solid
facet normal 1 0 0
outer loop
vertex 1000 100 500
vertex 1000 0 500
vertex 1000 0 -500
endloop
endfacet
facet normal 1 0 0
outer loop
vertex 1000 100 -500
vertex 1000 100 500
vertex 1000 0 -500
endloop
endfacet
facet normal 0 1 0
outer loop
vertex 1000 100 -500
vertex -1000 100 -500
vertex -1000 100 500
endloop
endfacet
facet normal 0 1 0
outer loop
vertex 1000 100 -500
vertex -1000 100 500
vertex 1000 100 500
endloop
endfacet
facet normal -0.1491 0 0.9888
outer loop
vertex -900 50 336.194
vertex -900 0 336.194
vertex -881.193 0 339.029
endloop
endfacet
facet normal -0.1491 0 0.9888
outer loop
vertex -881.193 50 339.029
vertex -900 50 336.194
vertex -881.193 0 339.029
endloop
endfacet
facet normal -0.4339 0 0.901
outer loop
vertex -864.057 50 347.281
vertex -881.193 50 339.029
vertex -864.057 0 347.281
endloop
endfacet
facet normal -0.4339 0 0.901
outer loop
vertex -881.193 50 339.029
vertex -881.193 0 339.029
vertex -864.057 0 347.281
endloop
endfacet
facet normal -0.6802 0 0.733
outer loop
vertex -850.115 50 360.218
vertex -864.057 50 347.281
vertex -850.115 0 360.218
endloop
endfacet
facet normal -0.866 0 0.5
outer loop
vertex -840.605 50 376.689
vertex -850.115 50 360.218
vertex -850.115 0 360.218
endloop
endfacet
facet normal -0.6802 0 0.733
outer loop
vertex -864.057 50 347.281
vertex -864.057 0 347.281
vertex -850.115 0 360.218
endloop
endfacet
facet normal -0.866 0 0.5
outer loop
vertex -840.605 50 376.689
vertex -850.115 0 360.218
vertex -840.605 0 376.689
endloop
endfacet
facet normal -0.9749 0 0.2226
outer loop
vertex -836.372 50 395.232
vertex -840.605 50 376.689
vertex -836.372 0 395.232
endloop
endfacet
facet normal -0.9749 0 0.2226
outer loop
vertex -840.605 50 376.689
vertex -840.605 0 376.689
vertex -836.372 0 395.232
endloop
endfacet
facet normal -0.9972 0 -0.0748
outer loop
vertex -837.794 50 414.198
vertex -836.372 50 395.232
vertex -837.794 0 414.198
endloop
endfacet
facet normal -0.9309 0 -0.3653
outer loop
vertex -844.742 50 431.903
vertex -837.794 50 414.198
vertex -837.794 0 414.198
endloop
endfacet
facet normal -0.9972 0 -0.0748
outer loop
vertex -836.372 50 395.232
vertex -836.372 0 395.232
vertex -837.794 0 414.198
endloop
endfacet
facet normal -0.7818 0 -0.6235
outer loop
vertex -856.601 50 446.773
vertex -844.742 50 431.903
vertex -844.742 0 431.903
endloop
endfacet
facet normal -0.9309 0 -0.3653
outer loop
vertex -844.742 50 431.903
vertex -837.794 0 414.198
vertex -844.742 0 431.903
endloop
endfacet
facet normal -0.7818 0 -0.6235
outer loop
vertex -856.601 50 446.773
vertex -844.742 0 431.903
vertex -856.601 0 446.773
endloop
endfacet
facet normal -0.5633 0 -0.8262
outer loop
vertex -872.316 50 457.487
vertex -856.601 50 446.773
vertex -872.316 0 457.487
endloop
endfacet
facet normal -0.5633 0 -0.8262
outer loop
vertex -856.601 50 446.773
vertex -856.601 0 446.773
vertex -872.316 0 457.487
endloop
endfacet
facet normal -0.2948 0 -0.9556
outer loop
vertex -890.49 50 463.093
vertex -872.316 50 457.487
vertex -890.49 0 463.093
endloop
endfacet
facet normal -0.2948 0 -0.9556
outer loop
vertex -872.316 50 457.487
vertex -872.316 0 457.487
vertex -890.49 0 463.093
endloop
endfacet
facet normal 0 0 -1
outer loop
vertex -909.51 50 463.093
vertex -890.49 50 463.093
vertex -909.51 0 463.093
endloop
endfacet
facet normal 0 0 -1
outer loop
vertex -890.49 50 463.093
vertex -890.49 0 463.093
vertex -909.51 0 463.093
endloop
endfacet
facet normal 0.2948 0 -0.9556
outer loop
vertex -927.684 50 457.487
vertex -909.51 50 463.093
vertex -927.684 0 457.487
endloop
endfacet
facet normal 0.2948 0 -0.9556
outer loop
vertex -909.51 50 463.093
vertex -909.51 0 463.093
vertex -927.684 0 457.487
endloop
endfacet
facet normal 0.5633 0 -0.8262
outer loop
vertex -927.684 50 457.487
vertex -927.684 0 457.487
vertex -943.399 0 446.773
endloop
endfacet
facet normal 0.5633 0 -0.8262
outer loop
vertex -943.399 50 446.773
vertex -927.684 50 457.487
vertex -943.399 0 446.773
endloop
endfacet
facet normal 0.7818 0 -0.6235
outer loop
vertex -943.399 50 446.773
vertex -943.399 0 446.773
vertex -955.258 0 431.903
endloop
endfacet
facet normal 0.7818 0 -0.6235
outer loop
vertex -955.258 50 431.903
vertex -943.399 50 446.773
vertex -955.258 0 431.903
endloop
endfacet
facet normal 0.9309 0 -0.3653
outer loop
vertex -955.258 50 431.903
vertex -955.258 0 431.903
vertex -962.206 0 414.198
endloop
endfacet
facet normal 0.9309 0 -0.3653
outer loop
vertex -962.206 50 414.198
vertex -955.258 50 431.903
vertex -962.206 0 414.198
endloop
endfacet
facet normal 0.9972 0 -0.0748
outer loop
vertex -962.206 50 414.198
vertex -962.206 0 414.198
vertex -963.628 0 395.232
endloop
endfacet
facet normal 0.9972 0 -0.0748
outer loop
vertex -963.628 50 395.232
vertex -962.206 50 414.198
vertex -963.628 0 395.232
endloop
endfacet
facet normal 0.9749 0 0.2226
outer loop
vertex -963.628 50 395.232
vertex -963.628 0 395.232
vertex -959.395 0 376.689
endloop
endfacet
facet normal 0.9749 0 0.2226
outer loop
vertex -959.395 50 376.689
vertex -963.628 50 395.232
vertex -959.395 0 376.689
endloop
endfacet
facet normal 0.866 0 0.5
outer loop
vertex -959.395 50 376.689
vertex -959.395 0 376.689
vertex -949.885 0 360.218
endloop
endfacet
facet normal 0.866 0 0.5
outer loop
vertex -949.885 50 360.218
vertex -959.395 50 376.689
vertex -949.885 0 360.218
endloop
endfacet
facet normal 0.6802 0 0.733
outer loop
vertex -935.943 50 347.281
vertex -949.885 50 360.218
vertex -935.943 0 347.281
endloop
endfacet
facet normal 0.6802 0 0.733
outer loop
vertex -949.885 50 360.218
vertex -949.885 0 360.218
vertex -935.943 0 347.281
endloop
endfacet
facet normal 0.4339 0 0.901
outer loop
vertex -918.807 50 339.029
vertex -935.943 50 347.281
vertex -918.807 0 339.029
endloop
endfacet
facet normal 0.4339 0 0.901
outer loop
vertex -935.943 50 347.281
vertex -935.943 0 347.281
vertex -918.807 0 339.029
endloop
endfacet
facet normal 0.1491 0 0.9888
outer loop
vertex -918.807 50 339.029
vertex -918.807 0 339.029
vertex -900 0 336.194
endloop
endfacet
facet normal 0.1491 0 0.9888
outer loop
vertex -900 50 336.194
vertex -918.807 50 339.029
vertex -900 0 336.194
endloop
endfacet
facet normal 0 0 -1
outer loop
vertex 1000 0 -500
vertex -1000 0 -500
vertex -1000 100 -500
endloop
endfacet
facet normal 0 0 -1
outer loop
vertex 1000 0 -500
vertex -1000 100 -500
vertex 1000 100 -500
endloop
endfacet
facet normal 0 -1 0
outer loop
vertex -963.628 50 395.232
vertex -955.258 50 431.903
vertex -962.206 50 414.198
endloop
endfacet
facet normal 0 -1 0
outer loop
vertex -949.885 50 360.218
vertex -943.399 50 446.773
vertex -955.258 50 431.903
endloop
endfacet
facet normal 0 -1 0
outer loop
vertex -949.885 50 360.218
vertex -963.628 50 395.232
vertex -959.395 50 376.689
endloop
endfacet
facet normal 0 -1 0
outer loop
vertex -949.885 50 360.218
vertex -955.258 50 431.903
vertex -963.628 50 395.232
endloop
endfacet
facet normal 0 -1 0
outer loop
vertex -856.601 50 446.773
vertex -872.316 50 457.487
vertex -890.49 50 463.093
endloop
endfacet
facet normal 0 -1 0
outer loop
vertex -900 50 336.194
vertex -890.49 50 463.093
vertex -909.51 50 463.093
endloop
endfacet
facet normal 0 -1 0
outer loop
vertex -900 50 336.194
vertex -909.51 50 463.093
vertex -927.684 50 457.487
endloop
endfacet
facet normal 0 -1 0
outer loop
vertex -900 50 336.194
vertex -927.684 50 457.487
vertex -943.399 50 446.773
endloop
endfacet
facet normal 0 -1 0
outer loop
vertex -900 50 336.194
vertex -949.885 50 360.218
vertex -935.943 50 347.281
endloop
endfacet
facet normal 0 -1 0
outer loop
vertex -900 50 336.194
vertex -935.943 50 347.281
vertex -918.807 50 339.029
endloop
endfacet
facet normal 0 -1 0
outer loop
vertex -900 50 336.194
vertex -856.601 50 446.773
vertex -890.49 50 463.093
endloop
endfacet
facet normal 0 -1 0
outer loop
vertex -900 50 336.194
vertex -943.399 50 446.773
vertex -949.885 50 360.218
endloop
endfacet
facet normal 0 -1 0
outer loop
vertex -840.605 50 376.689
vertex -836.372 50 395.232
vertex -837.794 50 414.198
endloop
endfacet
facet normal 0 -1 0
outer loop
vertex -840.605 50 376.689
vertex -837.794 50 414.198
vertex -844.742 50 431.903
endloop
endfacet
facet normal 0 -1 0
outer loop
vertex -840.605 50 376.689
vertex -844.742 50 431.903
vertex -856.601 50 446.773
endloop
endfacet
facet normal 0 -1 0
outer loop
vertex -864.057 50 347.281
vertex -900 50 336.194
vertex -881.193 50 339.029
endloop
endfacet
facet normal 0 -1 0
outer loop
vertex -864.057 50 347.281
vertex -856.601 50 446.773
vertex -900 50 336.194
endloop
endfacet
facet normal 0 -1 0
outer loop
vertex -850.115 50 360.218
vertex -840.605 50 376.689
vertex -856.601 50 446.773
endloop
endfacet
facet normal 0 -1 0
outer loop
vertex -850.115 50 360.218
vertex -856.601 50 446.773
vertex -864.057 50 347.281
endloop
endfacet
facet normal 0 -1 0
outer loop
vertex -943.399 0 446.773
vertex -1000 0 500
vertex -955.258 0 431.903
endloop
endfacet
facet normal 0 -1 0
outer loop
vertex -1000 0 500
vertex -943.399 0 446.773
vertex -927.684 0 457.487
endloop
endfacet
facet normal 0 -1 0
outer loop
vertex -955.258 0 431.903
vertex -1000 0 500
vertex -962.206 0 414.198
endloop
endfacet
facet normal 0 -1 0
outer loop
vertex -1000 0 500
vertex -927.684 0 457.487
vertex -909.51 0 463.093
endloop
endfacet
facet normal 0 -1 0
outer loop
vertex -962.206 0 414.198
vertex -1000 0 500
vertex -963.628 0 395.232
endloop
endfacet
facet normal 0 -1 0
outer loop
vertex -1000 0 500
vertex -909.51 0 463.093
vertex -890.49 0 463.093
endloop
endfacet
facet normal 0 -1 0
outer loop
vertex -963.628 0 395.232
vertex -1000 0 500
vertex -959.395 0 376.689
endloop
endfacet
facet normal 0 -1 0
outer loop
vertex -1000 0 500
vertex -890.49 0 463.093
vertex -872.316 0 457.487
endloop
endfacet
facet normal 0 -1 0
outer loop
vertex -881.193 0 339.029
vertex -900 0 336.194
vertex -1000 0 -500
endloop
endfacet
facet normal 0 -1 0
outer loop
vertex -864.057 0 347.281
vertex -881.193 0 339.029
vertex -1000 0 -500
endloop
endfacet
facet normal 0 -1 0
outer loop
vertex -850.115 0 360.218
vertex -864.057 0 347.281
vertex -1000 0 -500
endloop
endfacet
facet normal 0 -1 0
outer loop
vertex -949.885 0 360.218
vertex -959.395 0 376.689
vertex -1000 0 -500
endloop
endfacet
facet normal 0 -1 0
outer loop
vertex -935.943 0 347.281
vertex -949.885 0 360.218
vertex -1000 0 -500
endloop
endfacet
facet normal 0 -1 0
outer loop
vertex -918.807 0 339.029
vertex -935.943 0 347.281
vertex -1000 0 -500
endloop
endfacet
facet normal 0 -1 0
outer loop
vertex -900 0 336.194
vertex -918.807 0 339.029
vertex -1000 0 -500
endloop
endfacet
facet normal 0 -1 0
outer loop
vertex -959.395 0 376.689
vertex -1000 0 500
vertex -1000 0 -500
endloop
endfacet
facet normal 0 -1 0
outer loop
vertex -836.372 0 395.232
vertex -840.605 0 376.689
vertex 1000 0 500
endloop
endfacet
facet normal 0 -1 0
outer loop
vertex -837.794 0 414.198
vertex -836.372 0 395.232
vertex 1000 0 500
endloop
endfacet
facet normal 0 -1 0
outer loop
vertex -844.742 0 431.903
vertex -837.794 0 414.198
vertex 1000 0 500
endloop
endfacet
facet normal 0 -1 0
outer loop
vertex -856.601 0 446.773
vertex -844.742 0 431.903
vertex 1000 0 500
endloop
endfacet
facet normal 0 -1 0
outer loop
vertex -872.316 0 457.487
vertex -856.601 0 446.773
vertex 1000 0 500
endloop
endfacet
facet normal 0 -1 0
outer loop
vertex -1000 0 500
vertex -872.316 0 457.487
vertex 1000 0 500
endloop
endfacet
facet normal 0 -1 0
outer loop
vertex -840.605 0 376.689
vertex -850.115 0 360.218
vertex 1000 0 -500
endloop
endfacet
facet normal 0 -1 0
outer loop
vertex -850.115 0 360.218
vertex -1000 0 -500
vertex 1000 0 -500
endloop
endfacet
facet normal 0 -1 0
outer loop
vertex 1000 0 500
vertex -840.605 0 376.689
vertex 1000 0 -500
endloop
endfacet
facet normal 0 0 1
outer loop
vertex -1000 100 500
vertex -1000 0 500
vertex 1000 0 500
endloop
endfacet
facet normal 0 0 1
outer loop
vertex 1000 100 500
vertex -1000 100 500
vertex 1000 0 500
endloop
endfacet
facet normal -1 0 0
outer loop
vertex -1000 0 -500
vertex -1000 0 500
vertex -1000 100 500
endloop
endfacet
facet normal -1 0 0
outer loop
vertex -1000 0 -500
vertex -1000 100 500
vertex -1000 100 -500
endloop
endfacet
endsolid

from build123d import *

# Parameters (mm, degrees)
SKETCH1_W           = 2000
SKETCH1_H           = 1000
BOSS_EXTRUDE1_DEPTH = 100
SKETCH2_R           = 63.805939075
CUT_EXTRUDE2_DEPTH  = 50


with BuildPart() as part:
    # Sketch1 → Boss-Extrude1 (new body)
    with BuildSketch(Plane(origin=(0, 0, 0), x_dir=(1, 0, 0), z_dir=(0, 1, 0))):
        Rectangle(SKETCH1_W, SKETCH1_H)
    extrude(amount=BOSS_EXTRUDE1_DEPTH)

    # Sketch2 → Cut-Extrude2 (cut, symmetric)
    with BuildSketch(Plane.XZ):
        with Locations(Location((-900, 400, 0), (0, 0, 270))):
            Circle(SKETCH2_R)
    extrude(amount=CUT_EXTRUDE2_DEPTH, both=True, mode=Mode.SUBTRACT)


solid = part.part
